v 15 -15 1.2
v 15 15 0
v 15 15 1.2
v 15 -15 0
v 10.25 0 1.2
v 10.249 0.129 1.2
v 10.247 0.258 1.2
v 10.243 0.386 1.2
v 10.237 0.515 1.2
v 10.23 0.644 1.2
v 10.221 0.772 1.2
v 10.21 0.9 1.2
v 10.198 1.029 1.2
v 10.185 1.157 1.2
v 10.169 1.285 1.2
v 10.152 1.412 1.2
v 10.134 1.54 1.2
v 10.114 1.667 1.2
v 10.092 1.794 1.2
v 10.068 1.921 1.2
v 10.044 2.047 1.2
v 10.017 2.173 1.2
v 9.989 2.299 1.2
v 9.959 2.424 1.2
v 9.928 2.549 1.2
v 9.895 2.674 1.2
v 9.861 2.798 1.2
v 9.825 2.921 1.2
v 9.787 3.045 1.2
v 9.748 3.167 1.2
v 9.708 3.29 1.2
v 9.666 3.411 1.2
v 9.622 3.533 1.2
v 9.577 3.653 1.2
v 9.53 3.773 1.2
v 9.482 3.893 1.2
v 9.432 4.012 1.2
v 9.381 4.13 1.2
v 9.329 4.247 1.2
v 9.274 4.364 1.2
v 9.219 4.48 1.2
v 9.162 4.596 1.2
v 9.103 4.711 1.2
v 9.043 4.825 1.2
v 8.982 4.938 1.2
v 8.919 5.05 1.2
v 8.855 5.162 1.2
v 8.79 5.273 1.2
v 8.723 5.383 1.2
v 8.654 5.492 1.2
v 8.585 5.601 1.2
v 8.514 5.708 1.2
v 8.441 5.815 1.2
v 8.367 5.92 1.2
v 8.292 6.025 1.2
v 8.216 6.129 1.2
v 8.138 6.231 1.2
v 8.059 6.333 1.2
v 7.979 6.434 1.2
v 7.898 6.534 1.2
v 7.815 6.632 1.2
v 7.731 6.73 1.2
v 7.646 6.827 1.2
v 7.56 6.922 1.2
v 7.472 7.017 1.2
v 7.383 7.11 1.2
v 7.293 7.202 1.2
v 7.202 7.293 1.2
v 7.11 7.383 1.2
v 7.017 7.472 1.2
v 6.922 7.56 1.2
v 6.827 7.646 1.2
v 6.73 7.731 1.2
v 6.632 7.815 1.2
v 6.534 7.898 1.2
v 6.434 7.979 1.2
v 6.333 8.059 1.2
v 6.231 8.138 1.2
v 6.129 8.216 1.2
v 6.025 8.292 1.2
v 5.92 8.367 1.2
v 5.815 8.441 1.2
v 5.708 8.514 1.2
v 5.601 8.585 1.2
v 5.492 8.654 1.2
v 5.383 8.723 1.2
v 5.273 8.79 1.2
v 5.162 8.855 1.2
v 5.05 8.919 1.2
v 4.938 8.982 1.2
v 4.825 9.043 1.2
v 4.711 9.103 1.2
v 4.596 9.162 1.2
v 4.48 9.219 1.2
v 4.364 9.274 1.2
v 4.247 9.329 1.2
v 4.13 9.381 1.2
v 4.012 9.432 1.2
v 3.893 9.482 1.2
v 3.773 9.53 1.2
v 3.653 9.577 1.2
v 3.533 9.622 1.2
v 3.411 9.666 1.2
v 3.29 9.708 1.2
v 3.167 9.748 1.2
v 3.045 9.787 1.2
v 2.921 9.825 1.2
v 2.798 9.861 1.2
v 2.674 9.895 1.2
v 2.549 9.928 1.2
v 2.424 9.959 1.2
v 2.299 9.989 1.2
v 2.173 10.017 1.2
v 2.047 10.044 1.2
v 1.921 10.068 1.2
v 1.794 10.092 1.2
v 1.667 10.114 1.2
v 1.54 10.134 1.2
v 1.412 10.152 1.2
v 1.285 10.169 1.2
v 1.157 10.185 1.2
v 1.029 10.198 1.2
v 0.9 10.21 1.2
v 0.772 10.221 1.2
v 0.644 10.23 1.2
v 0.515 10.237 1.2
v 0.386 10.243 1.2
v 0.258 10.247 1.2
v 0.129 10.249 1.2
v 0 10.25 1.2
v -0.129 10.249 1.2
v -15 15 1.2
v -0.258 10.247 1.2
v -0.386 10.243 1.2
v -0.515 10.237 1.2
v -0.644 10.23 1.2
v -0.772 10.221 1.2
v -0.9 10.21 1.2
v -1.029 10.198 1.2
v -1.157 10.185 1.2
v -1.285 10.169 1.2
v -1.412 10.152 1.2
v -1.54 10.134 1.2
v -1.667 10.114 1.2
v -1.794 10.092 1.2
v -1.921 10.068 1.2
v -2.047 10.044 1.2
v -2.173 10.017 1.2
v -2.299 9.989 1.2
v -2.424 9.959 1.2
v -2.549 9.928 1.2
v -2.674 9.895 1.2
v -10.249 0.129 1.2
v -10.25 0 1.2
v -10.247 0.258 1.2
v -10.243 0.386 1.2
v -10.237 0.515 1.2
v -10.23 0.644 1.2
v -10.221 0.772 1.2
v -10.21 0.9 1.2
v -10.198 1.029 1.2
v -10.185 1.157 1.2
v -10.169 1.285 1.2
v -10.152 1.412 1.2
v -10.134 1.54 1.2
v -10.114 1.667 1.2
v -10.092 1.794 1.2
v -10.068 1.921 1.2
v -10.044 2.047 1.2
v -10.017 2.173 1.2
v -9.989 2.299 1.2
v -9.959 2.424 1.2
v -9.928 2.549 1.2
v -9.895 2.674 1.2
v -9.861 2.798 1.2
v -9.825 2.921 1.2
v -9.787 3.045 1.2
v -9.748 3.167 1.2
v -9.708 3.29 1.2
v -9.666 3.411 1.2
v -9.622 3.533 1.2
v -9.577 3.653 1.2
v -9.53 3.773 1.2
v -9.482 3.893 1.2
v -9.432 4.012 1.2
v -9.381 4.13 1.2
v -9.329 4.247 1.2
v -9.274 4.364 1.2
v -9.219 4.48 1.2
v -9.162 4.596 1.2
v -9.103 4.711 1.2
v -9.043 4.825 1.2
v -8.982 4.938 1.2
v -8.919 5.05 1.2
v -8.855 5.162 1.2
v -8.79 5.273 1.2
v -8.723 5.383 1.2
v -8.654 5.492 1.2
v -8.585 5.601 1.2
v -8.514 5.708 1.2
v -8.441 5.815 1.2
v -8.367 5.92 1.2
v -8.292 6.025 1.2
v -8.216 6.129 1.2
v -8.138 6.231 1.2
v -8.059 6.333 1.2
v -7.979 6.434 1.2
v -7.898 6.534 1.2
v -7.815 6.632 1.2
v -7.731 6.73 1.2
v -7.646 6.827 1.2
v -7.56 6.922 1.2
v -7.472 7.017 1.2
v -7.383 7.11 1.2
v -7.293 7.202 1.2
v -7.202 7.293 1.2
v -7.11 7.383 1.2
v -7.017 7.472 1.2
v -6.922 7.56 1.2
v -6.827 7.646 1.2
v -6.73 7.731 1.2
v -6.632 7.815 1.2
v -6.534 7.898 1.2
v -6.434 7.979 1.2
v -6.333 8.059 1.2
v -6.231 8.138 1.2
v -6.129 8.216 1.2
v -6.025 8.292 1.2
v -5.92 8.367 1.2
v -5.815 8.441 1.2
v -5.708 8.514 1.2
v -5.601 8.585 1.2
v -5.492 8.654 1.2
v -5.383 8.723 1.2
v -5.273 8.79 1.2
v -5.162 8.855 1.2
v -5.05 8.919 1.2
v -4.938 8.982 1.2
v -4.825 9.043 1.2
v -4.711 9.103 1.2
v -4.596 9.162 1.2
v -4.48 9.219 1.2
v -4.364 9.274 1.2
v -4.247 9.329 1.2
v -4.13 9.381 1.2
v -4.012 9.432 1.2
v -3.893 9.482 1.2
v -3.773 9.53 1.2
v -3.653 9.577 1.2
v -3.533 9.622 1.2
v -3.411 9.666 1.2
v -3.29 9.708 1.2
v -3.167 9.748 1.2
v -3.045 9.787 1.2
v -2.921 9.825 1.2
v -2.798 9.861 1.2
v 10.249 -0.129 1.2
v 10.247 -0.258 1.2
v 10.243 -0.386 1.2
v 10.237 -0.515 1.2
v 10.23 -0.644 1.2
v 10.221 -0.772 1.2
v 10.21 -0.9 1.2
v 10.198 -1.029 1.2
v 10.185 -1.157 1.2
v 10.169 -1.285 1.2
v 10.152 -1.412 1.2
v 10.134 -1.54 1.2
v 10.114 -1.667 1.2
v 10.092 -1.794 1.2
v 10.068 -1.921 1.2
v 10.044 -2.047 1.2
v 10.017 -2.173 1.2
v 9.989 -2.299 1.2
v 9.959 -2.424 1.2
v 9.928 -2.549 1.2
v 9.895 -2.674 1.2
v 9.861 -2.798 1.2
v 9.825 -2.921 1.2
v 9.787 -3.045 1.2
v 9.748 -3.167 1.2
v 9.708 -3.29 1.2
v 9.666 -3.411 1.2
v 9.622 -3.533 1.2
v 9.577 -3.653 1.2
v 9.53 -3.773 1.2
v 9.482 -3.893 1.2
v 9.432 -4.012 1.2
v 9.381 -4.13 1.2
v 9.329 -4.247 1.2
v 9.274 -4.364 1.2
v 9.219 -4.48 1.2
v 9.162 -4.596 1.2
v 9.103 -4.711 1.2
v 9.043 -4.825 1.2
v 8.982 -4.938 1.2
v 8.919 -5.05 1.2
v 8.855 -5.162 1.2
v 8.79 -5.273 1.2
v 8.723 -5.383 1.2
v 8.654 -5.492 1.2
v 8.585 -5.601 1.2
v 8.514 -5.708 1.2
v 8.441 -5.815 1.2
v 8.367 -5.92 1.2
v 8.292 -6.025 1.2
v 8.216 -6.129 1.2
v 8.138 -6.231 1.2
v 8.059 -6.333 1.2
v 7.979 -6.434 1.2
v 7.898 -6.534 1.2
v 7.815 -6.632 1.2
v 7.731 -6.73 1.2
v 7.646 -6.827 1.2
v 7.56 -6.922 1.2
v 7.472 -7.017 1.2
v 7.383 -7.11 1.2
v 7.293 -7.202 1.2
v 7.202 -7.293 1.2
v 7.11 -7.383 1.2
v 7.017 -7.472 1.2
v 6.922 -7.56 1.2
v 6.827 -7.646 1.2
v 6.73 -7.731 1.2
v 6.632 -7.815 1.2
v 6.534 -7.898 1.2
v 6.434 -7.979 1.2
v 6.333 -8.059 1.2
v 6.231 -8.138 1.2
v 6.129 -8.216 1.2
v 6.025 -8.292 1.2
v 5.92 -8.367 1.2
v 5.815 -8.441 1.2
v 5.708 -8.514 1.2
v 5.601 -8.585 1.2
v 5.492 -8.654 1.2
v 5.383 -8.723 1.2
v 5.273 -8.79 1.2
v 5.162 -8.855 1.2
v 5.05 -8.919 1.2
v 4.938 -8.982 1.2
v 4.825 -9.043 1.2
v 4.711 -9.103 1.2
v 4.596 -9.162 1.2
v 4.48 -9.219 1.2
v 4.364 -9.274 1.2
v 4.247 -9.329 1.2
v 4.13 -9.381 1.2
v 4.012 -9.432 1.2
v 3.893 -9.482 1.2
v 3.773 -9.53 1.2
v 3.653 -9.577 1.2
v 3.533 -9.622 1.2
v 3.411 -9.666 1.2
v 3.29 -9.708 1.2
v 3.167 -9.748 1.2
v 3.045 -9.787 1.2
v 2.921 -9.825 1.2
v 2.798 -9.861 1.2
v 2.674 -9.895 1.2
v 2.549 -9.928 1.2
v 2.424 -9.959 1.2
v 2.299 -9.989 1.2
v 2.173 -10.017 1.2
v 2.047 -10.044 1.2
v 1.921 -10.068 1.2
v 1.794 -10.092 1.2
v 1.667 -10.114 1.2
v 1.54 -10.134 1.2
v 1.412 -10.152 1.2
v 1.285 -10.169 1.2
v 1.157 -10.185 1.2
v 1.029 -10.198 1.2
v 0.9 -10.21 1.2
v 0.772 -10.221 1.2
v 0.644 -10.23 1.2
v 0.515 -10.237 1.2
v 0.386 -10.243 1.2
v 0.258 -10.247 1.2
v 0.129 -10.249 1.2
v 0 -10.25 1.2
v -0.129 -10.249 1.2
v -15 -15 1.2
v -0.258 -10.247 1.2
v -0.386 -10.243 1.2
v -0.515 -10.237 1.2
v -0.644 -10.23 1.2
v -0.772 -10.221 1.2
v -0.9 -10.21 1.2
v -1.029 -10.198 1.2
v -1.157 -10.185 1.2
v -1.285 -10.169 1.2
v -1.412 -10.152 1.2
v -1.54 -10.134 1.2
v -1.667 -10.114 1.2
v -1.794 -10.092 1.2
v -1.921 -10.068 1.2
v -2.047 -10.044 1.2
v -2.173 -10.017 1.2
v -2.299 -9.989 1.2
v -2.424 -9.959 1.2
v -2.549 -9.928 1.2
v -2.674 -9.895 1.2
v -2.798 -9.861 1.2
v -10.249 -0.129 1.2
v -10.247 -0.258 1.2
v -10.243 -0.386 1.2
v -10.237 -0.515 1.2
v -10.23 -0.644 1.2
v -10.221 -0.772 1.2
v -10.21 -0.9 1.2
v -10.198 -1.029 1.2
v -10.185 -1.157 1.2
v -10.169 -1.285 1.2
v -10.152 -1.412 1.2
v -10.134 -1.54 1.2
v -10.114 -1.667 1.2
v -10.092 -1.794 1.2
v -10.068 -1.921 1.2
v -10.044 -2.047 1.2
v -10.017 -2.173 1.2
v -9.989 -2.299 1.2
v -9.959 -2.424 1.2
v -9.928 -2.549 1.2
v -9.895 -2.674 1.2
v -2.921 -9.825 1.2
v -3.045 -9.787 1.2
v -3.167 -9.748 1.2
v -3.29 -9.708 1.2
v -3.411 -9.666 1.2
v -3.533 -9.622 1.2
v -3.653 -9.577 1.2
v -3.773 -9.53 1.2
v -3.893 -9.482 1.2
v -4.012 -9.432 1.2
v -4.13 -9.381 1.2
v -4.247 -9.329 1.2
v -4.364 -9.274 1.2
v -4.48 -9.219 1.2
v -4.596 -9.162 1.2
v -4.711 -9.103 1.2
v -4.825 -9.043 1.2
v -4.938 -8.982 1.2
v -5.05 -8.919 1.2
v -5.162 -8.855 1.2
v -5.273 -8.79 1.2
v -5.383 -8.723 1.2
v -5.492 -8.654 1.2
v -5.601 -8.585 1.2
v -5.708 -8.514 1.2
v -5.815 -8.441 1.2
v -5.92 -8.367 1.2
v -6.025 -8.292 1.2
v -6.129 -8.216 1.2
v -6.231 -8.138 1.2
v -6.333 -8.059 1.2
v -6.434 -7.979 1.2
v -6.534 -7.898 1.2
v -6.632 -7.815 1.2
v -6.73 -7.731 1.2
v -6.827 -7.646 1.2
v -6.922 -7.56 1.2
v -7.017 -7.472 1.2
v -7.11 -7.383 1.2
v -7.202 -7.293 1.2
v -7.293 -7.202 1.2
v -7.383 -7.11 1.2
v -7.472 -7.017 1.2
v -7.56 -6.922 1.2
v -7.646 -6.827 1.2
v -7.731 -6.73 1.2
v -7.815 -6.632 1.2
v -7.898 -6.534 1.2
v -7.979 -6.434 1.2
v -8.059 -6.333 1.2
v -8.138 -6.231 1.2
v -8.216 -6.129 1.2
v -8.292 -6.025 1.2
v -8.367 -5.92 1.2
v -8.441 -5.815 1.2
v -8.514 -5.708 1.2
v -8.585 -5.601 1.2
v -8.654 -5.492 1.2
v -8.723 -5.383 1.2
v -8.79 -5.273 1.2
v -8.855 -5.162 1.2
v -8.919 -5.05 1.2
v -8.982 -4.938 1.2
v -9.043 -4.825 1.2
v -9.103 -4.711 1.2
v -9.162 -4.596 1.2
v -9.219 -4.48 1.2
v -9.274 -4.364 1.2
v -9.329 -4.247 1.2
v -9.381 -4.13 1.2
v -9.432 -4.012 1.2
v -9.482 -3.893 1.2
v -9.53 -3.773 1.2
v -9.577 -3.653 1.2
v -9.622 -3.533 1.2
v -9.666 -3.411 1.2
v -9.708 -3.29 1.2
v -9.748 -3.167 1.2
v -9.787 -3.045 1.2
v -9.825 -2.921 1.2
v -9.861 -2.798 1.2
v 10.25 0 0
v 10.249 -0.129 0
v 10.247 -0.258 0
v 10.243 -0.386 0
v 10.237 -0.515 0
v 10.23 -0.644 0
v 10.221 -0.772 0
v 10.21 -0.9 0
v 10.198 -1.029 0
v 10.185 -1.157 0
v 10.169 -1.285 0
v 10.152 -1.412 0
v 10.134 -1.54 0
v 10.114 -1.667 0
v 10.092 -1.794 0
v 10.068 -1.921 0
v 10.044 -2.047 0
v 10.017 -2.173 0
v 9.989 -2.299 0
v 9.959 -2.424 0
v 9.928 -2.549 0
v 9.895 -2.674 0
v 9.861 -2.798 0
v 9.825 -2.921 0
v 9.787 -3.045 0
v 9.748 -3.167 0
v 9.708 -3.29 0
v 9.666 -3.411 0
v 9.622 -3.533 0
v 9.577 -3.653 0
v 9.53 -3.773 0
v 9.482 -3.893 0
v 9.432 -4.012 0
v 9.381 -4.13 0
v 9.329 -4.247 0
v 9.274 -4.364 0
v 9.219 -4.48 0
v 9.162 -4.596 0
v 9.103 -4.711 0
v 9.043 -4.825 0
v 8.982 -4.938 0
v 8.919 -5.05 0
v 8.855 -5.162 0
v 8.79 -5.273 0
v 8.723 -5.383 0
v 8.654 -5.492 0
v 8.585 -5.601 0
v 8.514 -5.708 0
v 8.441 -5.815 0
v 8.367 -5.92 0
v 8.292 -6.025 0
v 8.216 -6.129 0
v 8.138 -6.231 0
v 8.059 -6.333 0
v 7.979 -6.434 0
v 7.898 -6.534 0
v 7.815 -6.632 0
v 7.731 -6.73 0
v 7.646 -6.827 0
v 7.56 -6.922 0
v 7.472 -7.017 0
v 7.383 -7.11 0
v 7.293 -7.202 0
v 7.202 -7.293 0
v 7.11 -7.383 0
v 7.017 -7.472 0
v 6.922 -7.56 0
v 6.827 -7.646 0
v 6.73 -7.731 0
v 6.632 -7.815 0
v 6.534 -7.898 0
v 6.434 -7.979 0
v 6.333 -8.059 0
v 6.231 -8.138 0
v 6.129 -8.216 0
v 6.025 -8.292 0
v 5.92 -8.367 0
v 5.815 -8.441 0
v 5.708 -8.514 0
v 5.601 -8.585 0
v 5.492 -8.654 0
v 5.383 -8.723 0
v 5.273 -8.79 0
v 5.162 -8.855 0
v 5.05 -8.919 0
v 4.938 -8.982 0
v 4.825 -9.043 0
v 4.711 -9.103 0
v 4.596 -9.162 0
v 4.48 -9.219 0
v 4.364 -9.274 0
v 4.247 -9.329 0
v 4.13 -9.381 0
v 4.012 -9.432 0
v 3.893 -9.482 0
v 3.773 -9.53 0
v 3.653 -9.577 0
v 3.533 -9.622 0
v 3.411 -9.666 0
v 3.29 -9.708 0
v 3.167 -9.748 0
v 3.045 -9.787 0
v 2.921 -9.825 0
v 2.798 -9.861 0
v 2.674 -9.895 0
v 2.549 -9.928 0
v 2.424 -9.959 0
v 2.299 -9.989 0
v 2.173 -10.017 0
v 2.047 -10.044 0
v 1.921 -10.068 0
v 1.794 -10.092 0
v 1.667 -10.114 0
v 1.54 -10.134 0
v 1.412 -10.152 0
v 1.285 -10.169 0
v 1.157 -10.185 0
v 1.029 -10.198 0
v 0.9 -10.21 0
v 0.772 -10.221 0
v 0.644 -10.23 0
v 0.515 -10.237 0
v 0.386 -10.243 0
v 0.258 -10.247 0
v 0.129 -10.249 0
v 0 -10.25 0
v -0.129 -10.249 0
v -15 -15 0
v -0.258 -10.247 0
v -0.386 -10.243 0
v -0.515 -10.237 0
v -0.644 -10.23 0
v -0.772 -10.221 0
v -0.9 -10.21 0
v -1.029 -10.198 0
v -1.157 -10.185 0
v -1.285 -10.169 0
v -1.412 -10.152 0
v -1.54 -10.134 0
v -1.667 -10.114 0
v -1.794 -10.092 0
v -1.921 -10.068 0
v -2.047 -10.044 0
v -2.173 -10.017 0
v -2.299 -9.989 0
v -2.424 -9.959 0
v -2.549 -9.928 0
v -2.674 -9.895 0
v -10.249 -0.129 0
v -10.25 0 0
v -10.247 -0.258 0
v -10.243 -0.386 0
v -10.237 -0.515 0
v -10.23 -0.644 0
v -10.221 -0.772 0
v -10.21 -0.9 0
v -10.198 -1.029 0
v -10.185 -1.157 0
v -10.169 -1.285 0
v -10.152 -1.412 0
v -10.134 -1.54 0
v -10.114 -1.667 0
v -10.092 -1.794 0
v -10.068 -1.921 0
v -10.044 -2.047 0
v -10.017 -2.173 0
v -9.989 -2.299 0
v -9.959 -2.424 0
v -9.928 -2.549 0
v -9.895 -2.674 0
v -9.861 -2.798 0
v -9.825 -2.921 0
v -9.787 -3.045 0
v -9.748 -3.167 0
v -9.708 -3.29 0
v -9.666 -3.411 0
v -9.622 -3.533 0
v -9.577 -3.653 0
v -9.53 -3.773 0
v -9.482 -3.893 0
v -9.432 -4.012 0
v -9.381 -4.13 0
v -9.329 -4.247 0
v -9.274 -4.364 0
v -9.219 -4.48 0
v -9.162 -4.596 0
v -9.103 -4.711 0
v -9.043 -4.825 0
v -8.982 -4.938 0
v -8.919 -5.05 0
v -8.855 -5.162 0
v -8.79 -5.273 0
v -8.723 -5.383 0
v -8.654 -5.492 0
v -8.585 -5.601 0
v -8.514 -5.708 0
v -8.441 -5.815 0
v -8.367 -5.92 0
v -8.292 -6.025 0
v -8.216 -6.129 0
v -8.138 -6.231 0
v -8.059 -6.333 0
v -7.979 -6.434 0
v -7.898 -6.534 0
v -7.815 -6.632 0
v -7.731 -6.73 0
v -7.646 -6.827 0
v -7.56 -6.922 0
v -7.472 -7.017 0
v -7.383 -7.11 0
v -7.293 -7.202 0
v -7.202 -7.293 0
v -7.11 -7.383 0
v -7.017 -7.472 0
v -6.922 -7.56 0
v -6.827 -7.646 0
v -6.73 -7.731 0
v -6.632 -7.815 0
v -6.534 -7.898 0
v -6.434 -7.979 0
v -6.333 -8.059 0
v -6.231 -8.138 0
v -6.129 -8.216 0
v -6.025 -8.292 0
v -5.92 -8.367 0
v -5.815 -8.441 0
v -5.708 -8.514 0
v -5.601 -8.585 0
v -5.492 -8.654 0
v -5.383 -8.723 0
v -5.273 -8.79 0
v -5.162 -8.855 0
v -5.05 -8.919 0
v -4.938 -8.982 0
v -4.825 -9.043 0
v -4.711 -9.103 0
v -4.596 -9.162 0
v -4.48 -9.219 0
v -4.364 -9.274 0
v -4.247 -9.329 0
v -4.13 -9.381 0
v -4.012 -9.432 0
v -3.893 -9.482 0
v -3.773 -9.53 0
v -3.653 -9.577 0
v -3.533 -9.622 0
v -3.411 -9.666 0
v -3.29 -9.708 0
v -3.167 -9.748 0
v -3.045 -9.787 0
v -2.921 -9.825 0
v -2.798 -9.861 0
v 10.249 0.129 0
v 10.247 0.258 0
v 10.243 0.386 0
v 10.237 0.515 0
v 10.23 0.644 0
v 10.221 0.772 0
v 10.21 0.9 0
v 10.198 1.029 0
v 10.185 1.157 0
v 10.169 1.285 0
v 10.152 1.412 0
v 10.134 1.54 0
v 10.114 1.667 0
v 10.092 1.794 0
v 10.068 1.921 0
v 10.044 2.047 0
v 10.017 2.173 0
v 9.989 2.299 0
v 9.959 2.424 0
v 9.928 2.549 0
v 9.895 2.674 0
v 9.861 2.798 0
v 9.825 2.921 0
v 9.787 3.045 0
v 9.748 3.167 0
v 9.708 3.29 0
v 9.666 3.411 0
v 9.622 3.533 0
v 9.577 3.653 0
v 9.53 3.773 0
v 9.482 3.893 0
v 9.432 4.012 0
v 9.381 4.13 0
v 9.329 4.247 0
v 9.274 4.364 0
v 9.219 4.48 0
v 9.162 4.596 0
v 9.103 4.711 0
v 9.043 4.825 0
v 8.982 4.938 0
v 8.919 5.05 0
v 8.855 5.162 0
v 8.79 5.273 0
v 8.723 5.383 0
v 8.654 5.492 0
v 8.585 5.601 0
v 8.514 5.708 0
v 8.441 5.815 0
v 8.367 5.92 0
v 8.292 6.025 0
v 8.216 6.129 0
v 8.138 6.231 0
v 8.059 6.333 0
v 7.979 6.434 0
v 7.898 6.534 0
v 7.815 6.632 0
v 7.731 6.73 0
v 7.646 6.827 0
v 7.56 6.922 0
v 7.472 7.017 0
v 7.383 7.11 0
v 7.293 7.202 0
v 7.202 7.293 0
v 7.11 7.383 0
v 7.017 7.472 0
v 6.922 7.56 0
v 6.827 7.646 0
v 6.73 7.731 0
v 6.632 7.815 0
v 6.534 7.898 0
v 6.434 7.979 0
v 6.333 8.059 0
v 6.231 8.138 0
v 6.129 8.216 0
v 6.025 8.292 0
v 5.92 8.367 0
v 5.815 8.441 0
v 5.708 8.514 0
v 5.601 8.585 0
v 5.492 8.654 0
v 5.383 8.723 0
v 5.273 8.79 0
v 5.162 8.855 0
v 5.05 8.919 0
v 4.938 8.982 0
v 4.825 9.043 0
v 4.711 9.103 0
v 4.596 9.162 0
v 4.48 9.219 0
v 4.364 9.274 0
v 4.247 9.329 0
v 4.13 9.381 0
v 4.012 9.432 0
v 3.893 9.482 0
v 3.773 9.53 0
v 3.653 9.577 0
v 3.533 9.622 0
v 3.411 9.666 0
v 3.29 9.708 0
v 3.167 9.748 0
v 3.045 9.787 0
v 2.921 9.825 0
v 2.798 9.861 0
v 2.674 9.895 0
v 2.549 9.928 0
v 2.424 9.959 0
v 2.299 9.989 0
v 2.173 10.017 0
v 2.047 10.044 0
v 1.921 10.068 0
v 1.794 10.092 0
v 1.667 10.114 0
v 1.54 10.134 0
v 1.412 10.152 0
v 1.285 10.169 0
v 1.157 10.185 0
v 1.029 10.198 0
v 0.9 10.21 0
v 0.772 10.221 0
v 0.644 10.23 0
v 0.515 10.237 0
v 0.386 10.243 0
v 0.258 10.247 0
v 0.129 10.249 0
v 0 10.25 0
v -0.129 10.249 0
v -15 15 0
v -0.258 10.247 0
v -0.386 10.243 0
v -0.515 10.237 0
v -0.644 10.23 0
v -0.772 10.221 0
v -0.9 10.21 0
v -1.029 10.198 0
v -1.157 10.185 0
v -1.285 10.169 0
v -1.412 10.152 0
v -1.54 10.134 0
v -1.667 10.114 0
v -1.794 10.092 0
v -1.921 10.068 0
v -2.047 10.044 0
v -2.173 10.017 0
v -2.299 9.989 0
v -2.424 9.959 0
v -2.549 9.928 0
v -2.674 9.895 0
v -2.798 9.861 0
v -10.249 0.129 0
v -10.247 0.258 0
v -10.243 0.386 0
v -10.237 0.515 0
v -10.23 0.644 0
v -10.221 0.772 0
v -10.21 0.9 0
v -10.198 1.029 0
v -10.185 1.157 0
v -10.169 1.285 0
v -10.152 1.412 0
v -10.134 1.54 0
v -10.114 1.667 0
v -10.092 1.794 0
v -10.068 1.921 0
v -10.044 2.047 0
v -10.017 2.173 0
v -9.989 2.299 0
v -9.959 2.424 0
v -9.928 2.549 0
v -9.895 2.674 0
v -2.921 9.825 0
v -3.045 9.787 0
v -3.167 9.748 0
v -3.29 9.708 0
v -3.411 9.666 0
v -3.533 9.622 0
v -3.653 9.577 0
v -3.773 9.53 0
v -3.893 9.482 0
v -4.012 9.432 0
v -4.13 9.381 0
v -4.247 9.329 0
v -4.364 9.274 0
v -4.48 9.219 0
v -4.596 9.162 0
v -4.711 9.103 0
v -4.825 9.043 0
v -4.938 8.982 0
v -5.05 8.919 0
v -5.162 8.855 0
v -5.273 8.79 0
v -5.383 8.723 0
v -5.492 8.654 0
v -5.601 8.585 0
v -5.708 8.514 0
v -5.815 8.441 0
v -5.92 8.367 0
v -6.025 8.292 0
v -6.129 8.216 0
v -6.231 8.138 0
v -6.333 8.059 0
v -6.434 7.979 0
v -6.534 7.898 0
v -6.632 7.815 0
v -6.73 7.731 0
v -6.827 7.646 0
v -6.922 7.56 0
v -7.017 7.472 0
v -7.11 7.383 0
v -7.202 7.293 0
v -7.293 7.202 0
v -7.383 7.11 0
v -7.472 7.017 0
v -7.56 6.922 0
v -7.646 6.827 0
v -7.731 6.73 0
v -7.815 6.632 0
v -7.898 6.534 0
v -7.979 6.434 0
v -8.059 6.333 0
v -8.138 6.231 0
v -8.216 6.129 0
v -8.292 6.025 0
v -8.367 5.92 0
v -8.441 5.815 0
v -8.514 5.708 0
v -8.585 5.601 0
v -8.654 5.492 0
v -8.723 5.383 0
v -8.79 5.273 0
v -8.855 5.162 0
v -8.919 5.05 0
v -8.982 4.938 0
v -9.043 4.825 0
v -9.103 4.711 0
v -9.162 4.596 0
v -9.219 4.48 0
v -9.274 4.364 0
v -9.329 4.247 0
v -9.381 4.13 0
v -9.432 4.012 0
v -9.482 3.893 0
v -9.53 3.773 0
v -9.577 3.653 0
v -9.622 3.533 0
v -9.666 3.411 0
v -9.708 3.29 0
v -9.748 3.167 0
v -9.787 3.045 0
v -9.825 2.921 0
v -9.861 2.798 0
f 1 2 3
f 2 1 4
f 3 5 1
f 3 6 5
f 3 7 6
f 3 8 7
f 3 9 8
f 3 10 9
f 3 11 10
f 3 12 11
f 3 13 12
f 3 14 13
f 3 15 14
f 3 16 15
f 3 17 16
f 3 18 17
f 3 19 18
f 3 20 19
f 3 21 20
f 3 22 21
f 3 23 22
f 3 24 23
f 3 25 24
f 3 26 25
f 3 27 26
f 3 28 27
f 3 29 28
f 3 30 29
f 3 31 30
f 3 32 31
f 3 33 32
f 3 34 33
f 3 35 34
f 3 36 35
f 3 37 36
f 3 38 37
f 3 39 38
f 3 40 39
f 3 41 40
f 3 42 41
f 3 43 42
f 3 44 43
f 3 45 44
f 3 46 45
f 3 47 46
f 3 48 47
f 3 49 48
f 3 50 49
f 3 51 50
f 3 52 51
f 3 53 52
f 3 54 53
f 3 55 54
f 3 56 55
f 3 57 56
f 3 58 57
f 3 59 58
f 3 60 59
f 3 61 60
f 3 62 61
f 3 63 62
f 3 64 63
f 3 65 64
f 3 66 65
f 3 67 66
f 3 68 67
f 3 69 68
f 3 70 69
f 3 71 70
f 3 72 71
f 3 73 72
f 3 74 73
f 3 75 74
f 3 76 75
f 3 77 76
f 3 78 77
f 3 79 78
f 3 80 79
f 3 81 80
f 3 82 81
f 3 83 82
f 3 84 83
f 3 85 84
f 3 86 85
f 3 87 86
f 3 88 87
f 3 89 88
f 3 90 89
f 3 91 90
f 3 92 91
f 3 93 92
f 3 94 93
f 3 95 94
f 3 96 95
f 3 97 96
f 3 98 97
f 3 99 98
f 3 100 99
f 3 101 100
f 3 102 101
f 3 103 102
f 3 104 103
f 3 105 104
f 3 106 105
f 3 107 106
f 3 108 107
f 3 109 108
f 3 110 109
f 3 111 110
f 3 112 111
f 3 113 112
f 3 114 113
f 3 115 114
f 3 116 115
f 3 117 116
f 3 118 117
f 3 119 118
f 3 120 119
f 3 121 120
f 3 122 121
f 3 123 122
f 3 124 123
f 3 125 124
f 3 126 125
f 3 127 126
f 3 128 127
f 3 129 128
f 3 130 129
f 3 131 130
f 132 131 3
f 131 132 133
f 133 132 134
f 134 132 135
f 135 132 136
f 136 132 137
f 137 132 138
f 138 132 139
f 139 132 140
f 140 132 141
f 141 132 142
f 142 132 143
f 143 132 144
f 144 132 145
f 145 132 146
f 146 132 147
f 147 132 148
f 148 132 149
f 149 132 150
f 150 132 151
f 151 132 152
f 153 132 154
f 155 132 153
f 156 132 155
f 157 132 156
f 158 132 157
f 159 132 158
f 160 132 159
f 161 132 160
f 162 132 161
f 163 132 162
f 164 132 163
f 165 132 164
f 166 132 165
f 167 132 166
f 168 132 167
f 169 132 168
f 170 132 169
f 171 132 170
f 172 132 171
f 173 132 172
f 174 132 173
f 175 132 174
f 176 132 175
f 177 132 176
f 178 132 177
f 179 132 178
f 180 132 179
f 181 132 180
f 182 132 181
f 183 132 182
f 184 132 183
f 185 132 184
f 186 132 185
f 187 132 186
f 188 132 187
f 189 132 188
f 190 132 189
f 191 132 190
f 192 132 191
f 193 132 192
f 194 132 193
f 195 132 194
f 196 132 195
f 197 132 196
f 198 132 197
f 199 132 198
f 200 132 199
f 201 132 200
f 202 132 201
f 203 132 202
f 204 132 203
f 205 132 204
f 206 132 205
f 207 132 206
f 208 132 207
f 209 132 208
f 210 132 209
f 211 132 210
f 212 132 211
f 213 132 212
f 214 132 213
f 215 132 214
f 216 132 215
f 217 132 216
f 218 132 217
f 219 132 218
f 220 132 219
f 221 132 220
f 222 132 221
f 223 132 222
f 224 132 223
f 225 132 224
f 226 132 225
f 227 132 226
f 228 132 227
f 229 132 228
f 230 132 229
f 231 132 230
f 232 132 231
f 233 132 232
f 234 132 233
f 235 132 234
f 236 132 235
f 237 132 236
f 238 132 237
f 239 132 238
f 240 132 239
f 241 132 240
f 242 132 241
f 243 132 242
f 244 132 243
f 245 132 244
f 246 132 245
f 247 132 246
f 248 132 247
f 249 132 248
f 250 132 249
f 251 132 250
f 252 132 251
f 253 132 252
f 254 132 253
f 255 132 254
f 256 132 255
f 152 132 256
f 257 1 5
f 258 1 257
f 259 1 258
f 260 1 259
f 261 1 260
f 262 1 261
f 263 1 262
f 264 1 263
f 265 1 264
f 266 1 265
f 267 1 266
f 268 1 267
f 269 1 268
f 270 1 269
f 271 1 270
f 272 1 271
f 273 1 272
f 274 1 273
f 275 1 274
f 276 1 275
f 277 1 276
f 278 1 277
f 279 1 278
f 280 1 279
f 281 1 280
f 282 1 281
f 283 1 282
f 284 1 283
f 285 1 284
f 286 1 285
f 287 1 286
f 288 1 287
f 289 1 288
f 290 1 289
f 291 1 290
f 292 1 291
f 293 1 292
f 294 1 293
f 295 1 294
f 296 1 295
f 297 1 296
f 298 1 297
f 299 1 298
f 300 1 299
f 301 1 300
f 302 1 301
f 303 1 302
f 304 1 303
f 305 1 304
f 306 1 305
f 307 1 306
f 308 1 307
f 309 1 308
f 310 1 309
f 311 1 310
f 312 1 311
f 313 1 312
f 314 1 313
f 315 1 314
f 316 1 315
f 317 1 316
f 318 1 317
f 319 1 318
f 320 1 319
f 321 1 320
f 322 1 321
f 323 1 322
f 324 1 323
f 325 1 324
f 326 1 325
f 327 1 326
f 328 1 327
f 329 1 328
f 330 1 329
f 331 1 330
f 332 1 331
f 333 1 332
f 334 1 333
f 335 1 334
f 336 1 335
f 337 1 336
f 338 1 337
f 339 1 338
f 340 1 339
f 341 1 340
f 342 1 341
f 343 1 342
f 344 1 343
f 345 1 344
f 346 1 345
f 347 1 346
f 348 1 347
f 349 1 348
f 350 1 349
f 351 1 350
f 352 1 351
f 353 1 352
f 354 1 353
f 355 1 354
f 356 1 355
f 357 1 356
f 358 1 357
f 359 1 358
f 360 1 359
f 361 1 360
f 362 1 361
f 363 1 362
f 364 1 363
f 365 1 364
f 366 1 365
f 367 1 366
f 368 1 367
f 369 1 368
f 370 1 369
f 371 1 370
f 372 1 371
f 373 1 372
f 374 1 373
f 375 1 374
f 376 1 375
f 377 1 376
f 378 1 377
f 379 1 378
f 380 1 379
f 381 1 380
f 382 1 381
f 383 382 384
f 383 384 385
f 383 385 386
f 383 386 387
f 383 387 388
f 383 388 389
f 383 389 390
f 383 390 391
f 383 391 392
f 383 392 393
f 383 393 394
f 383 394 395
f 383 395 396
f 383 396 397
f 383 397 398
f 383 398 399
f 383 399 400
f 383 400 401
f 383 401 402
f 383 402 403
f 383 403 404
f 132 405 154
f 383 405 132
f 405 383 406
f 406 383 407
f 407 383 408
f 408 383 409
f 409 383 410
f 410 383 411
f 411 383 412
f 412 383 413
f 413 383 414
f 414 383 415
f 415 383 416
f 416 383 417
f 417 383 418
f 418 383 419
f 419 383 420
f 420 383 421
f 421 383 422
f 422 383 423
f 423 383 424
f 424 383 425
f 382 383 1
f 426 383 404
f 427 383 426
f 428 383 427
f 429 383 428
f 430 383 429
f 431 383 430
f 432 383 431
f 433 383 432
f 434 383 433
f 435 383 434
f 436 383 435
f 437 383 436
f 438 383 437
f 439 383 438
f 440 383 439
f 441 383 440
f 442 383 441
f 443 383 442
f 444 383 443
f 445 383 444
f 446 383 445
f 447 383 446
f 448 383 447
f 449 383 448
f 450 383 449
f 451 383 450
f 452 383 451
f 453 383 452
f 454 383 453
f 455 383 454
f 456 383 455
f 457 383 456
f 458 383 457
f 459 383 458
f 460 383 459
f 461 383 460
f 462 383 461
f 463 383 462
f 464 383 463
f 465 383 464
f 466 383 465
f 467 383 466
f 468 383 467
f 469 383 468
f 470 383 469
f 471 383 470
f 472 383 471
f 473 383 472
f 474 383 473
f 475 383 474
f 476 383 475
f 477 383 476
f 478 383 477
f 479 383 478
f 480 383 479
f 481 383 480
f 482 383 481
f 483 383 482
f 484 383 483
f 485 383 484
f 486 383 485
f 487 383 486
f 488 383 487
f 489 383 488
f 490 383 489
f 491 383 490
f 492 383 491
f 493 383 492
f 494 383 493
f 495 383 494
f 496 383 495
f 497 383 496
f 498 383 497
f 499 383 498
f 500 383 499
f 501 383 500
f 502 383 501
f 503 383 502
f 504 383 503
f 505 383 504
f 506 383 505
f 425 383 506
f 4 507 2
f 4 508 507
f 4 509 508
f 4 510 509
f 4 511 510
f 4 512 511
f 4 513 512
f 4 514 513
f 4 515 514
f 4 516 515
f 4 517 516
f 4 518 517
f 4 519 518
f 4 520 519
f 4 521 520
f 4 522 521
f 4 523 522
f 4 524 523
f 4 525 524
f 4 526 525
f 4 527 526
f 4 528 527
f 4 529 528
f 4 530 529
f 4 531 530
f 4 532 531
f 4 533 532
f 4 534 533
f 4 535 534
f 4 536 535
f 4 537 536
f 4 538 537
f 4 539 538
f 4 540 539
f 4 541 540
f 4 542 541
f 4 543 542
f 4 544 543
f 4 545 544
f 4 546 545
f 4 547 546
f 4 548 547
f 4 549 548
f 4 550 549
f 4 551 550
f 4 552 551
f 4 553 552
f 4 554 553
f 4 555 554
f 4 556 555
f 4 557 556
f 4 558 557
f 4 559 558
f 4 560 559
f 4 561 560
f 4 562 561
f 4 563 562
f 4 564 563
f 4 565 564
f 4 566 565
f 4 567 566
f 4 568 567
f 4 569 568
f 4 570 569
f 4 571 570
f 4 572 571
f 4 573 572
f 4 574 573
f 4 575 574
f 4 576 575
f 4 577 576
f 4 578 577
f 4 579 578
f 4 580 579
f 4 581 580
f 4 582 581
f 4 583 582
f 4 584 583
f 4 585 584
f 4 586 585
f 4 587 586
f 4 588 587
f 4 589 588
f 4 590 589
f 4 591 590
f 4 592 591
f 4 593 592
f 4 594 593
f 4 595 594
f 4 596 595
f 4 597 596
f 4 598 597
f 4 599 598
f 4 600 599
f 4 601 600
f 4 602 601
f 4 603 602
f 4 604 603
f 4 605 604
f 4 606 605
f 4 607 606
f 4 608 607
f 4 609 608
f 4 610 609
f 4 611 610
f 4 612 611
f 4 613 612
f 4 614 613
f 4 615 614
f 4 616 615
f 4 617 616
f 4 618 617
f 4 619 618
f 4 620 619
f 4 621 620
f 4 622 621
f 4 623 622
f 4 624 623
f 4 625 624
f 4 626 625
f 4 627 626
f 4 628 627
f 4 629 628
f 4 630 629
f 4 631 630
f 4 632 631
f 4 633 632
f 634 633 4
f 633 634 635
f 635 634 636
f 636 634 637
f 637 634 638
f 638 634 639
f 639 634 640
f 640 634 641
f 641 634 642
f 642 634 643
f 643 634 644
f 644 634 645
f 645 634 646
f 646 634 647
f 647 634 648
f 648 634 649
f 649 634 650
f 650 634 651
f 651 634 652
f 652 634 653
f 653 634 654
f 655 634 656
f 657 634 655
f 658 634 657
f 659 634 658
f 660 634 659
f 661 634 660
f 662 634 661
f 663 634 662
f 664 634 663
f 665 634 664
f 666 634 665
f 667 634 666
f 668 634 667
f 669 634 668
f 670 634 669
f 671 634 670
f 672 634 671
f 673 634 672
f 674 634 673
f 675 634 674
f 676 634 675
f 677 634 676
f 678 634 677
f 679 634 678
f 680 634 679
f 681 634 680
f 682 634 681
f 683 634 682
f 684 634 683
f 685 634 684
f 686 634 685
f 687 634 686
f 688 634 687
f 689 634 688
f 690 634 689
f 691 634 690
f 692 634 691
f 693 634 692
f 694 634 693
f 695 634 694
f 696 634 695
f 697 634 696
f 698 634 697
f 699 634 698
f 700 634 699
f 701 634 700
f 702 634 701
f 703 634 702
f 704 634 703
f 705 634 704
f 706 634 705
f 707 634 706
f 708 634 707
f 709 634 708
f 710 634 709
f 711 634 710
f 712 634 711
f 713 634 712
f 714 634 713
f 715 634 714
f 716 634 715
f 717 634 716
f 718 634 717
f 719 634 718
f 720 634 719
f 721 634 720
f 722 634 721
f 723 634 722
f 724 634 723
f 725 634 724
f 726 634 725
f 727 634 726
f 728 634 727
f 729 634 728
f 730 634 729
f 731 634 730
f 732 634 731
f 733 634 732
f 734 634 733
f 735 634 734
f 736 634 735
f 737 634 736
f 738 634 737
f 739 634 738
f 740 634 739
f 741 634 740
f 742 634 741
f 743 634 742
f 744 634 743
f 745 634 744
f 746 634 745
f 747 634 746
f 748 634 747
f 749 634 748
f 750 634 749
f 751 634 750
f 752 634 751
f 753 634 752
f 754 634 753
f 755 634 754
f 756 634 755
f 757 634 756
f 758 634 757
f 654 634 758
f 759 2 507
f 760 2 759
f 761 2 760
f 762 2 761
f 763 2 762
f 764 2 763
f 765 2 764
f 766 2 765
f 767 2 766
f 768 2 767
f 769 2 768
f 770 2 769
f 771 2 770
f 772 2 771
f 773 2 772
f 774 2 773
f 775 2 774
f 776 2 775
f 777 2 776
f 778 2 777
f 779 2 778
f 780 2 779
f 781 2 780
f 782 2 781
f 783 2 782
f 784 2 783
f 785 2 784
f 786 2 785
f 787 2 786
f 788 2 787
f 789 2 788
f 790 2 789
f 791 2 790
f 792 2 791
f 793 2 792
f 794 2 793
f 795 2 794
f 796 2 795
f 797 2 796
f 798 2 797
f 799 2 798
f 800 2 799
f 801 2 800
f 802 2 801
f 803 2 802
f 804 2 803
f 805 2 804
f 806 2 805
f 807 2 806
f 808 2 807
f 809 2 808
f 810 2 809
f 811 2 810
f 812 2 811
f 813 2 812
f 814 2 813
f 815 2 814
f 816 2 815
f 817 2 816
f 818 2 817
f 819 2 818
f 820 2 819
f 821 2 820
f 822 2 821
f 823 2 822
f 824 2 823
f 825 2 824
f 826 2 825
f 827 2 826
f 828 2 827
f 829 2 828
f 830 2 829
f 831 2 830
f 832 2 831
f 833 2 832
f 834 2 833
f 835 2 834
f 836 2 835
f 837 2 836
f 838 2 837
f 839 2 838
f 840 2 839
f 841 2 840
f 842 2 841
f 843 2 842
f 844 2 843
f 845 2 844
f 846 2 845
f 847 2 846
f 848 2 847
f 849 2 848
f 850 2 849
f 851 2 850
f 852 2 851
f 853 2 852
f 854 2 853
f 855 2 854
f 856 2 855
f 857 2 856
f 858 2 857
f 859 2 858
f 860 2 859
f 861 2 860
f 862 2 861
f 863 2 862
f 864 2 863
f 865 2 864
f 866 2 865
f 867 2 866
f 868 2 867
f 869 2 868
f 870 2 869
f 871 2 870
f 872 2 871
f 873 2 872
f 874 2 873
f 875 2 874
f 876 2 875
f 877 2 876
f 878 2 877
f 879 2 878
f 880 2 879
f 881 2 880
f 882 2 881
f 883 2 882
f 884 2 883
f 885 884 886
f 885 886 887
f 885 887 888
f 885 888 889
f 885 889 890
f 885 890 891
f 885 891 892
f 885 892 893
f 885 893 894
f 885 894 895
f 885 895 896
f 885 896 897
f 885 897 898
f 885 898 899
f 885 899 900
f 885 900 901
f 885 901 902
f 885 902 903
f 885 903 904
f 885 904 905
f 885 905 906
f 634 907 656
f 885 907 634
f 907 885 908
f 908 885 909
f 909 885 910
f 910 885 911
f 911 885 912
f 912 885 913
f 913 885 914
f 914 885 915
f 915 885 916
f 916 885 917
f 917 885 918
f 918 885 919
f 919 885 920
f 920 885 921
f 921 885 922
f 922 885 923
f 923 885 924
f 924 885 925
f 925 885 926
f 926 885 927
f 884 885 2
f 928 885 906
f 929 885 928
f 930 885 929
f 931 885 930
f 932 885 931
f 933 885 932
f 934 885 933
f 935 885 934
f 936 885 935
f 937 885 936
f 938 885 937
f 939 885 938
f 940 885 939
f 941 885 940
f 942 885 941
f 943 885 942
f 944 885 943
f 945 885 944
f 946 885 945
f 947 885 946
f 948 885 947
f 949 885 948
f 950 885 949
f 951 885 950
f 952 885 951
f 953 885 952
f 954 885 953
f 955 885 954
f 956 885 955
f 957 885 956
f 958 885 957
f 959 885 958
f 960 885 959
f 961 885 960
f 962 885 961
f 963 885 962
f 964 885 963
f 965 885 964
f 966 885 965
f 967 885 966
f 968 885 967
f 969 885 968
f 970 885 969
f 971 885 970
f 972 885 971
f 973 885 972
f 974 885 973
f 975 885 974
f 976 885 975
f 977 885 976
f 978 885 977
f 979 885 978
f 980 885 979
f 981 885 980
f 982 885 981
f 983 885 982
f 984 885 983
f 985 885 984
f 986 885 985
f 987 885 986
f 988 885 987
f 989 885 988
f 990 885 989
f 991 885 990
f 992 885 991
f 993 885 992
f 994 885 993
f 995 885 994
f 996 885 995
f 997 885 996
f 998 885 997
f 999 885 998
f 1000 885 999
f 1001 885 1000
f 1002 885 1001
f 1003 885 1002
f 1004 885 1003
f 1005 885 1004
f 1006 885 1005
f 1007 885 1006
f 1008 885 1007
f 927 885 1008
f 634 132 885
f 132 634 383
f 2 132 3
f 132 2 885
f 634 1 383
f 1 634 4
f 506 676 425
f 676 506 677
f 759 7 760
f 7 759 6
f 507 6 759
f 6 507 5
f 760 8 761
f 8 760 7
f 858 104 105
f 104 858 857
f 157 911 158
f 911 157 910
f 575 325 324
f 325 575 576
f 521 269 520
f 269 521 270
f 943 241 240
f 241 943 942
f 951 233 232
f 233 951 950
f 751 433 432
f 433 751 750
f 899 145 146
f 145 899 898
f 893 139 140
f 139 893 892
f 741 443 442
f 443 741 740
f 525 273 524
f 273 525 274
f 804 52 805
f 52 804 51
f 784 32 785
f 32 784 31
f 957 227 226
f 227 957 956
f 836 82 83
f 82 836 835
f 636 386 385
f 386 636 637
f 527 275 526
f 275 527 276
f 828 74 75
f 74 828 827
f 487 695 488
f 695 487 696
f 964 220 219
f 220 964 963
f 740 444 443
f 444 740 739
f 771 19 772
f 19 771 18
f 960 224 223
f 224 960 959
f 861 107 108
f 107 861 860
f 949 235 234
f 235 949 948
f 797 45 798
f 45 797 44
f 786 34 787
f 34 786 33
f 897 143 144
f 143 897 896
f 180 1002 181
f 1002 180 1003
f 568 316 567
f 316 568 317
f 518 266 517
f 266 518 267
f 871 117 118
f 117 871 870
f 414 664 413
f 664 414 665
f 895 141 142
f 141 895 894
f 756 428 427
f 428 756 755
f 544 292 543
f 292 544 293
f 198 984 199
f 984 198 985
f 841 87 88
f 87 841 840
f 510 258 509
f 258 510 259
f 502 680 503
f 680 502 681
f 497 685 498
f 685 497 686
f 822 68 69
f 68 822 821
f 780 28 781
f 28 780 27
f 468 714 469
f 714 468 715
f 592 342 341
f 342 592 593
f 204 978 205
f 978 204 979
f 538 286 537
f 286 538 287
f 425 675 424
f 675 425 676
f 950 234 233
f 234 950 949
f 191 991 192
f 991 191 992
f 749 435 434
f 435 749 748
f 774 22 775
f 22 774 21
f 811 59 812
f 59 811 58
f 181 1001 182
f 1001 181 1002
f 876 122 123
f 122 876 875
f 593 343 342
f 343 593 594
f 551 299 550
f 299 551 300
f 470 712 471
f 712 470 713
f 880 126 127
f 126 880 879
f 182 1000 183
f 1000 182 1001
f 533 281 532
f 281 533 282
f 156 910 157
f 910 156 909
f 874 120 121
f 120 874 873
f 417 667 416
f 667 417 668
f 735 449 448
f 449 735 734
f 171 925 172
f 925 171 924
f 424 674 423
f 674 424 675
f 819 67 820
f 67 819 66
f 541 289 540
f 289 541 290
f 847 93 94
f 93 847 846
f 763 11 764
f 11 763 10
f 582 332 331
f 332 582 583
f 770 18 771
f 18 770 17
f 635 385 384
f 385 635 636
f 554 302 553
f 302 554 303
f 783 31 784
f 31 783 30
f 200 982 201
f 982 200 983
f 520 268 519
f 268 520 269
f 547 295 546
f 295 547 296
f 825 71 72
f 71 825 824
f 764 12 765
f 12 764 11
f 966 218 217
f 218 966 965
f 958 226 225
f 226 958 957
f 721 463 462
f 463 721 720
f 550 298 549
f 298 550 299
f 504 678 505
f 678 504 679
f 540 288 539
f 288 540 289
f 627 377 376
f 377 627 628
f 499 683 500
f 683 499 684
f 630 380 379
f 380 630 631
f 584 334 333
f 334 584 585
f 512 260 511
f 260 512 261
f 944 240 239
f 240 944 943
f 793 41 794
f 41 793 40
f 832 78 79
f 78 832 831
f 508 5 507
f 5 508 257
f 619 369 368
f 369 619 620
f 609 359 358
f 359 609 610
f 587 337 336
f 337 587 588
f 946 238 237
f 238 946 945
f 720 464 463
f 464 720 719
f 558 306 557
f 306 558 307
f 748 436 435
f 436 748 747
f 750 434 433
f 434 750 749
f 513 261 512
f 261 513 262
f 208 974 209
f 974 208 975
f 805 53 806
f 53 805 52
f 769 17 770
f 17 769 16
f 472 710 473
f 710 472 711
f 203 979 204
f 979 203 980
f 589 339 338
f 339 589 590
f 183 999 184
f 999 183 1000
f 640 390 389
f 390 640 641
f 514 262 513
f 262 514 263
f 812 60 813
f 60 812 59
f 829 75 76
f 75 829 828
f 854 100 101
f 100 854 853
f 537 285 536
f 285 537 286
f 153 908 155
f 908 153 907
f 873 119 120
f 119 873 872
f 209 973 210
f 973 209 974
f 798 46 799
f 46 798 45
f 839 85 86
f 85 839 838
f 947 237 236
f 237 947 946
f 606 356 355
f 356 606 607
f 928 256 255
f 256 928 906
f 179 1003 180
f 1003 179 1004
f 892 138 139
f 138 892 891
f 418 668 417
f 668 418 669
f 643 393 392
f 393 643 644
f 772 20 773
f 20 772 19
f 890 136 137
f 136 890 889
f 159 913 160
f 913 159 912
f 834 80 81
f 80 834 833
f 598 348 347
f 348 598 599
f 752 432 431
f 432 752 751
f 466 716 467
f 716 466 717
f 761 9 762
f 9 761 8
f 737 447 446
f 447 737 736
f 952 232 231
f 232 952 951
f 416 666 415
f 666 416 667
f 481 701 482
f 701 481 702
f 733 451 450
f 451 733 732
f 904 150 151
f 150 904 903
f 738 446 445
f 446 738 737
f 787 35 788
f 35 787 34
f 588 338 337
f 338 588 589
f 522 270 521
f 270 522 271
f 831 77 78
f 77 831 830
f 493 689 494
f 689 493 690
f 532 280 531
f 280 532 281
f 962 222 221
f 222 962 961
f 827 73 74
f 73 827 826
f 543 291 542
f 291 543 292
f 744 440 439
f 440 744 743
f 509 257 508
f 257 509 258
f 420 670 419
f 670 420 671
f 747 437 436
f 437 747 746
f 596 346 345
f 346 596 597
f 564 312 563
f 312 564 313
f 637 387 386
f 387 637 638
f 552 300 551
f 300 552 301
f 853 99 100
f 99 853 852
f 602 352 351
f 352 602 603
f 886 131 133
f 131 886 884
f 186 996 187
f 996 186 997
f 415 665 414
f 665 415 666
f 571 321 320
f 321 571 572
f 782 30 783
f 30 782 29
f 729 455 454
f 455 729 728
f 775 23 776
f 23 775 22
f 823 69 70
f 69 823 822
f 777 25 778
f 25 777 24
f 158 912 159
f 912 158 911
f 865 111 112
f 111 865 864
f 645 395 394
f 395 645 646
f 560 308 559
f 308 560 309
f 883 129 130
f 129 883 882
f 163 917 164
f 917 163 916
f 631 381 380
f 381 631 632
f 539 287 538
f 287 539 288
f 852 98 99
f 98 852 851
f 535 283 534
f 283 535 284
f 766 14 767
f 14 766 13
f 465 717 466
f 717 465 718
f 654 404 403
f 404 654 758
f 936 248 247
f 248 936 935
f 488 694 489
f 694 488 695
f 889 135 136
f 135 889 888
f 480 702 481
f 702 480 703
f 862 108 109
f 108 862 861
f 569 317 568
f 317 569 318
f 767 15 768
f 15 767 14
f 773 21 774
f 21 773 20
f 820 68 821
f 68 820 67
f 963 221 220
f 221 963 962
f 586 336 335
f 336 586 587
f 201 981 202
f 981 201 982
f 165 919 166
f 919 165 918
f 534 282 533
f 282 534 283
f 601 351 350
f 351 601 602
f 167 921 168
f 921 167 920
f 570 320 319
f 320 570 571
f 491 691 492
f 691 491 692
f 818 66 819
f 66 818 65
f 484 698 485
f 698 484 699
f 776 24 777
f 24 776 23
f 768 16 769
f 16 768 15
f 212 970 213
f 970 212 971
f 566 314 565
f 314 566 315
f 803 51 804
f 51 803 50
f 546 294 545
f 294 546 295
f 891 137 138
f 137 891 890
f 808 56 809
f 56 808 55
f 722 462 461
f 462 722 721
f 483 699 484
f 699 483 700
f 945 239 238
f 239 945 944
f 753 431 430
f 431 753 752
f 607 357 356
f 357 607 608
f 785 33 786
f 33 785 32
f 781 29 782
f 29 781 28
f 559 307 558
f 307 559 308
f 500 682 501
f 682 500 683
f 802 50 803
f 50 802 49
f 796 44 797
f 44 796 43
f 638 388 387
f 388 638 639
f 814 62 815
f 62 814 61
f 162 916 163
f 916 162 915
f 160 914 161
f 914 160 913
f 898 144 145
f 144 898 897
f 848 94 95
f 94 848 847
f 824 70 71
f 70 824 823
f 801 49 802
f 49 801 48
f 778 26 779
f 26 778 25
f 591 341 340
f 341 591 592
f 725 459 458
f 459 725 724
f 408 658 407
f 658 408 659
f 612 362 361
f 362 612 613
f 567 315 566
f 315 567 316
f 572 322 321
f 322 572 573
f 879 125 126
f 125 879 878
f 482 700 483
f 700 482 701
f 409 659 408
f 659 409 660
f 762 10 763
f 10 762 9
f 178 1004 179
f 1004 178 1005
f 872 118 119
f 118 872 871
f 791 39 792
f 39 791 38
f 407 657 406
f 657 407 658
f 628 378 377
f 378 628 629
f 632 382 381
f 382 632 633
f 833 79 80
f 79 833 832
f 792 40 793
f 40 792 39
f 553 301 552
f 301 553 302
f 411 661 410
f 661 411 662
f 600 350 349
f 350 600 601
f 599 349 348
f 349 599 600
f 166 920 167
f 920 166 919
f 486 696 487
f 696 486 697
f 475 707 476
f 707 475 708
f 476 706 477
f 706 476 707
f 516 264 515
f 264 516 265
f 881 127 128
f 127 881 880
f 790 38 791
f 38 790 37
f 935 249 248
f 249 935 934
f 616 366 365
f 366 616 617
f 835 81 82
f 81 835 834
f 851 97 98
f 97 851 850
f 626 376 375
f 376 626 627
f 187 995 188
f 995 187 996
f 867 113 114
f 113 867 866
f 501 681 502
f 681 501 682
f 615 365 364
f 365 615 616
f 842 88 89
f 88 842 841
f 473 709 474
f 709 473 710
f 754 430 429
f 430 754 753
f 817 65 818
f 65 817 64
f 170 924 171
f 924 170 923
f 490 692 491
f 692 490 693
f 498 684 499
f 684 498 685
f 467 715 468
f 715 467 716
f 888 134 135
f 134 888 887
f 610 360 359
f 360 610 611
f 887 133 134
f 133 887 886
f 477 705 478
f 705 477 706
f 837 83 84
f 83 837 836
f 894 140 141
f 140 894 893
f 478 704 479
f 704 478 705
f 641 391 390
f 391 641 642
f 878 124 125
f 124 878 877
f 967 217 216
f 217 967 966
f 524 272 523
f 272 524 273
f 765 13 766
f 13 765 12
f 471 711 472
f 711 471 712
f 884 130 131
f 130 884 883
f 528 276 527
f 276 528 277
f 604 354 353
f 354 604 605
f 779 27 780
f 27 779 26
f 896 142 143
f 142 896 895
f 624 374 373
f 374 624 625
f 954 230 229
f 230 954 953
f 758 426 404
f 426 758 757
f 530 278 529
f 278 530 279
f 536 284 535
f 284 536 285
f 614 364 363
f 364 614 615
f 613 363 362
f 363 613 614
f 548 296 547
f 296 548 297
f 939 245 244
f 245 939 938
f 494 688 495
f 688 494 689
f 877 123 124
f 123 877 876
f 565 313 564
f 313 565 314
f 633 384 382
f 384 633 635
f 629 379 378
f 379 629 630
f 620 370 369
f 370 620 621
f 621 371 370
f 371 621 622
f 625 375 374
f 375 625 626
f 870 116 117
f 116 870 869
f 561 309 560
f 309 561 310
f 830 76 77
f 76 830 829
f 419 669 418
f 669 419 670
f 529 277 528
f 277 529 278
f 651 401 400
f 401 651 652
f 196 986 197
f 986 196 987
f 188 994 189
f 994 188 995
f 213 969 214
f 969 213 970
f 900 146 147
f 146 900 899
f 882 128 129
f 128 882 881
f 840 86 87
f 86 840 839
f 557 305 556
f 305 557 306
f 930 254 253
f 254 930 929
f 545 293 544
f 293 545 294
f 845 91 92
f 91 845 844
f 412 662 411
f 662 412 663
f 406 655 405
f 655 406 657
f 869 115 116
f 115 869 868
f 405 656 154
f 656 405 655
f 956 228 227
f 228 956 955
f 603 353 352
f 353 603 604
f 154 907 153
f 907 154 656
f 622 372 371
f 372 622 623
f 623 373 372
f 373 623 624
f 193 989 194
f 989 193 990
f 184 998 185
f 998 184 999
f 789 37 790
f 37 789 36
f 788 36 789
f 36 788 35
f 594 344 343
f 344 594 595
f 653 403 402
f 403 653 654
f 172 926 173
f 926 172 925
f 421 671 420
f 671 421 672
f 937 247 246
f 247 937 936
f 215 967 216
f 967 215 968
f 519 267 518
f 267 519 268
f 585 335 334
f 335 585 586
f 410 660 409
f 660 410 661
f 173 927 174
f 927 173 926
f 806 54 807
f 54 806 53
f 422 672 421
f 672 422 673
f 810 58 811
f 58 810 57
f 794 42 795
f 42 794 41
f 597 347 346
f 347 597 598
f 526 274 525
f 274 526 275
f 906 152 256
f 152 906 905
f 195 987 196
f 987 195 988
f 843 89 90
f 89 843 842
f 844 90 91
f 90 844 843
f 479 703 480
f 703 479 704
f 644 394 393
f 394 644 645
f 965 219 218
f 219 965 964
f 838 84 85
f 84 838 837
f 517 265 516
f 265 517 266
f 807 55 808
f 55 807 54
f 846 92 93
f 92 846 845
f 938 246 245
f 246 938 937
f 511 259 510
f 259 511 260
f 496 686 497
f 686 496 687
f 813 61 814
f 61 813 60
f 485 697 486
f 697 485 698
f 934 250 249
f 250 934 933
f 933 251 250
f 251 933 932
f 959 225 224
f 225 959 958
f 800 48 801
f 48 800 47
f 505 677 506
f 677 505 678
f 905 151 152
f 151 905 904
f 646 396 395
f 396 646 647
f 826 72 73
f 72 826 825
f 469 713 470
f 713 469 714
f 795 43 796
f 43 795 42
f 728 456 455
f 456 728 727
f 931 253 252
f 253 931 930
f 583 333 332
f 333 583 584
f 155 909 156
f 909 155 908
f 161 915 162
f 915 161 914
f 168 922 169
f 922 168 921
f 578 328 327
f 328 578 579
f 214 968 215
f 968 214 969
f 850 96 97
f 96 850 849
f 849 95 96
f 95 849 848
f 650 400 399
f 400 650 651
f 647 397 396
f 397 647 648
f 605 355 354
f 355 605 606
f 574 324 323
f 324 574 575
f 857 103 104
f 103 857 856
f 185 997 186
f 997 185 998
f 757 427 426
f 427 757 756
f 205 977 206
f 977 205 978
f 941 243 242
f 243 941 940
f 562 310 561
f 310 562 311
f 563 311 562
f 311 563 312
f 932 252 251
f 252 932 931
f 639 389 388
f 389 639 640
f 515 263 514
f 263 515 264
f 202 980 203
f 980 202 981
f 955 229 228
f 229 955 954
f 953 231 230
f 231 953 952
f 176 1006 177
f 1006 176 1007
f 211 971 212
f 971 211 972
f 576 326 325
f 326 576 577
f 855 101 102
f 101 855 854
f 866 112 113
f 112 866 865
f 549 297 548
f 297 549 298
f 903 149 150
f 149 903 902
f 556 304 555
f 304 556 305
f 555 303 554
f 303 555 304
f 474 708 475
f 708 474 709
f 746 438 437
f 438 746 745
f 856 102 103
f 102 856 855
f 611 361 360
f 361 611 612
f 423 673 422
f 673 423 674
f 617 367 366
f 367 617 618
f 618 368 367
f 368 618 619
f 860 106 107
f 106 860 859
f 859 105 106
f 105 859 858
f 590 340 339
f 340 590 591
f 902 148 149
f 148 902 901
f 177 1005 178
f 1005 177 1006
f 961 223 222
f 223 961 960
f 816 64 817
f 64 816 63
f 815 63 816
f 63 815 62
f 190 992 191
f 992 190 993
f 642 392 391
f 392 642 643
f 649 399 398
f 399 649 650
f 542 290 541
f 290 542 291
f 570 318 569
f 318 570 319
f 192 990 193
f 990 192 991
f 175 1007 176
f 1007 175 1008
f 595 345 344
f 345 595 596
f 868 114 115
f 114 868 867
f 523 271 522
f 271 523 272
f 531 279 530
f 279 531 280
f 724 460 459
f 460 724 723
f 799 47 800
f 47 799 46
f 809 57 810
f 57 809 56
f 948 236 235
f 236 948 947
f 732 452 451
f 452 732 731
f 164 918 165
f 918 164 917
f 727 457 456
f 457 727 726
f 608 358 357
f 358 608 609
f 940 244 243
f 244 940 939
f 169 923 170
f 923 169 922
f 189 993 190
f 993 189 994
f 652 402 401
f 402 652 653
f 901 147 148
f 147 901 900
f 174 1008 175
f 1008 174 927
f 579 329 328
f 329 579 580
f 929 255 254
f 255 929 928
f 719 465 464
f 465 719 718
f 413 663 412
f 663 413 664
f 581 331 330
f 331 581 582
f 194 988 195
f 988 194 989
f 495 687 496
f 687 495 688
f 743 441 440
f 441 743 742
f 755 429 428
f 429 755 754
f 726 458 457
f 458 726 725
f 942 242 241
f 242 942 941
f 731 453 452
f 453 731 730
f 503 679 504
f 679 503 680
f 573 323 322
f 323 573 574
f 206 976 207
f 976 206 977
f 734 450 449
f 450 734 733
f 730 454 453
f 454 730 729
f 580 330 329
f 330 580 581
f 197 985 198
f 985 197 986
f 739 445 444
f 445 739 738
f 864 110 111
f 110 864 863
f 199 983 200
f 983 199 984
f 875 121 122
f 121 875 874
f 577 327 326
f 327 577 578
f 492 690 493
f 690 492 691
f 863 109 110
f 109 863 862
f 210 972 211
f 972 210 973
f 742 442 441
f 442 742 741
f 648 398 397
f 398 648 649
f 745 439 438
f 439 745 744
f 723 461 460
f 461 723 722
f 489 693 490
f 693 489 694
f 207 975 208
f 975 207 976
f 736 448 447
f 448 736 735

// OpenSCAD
$fn=500;    // zum testen den Wert auf <50 setzen

db  = 20+0.5;   // Durchmesser Bohrung + Toleranz 
br = 30;		// Länge/Breite Grundplatte
ws = 1.2;		// Wandstärke

difference() {
	translate([-br/2,-br/2,0]) cube([br,br,ws]);
	cylinder(h=ws,d=db);
}
